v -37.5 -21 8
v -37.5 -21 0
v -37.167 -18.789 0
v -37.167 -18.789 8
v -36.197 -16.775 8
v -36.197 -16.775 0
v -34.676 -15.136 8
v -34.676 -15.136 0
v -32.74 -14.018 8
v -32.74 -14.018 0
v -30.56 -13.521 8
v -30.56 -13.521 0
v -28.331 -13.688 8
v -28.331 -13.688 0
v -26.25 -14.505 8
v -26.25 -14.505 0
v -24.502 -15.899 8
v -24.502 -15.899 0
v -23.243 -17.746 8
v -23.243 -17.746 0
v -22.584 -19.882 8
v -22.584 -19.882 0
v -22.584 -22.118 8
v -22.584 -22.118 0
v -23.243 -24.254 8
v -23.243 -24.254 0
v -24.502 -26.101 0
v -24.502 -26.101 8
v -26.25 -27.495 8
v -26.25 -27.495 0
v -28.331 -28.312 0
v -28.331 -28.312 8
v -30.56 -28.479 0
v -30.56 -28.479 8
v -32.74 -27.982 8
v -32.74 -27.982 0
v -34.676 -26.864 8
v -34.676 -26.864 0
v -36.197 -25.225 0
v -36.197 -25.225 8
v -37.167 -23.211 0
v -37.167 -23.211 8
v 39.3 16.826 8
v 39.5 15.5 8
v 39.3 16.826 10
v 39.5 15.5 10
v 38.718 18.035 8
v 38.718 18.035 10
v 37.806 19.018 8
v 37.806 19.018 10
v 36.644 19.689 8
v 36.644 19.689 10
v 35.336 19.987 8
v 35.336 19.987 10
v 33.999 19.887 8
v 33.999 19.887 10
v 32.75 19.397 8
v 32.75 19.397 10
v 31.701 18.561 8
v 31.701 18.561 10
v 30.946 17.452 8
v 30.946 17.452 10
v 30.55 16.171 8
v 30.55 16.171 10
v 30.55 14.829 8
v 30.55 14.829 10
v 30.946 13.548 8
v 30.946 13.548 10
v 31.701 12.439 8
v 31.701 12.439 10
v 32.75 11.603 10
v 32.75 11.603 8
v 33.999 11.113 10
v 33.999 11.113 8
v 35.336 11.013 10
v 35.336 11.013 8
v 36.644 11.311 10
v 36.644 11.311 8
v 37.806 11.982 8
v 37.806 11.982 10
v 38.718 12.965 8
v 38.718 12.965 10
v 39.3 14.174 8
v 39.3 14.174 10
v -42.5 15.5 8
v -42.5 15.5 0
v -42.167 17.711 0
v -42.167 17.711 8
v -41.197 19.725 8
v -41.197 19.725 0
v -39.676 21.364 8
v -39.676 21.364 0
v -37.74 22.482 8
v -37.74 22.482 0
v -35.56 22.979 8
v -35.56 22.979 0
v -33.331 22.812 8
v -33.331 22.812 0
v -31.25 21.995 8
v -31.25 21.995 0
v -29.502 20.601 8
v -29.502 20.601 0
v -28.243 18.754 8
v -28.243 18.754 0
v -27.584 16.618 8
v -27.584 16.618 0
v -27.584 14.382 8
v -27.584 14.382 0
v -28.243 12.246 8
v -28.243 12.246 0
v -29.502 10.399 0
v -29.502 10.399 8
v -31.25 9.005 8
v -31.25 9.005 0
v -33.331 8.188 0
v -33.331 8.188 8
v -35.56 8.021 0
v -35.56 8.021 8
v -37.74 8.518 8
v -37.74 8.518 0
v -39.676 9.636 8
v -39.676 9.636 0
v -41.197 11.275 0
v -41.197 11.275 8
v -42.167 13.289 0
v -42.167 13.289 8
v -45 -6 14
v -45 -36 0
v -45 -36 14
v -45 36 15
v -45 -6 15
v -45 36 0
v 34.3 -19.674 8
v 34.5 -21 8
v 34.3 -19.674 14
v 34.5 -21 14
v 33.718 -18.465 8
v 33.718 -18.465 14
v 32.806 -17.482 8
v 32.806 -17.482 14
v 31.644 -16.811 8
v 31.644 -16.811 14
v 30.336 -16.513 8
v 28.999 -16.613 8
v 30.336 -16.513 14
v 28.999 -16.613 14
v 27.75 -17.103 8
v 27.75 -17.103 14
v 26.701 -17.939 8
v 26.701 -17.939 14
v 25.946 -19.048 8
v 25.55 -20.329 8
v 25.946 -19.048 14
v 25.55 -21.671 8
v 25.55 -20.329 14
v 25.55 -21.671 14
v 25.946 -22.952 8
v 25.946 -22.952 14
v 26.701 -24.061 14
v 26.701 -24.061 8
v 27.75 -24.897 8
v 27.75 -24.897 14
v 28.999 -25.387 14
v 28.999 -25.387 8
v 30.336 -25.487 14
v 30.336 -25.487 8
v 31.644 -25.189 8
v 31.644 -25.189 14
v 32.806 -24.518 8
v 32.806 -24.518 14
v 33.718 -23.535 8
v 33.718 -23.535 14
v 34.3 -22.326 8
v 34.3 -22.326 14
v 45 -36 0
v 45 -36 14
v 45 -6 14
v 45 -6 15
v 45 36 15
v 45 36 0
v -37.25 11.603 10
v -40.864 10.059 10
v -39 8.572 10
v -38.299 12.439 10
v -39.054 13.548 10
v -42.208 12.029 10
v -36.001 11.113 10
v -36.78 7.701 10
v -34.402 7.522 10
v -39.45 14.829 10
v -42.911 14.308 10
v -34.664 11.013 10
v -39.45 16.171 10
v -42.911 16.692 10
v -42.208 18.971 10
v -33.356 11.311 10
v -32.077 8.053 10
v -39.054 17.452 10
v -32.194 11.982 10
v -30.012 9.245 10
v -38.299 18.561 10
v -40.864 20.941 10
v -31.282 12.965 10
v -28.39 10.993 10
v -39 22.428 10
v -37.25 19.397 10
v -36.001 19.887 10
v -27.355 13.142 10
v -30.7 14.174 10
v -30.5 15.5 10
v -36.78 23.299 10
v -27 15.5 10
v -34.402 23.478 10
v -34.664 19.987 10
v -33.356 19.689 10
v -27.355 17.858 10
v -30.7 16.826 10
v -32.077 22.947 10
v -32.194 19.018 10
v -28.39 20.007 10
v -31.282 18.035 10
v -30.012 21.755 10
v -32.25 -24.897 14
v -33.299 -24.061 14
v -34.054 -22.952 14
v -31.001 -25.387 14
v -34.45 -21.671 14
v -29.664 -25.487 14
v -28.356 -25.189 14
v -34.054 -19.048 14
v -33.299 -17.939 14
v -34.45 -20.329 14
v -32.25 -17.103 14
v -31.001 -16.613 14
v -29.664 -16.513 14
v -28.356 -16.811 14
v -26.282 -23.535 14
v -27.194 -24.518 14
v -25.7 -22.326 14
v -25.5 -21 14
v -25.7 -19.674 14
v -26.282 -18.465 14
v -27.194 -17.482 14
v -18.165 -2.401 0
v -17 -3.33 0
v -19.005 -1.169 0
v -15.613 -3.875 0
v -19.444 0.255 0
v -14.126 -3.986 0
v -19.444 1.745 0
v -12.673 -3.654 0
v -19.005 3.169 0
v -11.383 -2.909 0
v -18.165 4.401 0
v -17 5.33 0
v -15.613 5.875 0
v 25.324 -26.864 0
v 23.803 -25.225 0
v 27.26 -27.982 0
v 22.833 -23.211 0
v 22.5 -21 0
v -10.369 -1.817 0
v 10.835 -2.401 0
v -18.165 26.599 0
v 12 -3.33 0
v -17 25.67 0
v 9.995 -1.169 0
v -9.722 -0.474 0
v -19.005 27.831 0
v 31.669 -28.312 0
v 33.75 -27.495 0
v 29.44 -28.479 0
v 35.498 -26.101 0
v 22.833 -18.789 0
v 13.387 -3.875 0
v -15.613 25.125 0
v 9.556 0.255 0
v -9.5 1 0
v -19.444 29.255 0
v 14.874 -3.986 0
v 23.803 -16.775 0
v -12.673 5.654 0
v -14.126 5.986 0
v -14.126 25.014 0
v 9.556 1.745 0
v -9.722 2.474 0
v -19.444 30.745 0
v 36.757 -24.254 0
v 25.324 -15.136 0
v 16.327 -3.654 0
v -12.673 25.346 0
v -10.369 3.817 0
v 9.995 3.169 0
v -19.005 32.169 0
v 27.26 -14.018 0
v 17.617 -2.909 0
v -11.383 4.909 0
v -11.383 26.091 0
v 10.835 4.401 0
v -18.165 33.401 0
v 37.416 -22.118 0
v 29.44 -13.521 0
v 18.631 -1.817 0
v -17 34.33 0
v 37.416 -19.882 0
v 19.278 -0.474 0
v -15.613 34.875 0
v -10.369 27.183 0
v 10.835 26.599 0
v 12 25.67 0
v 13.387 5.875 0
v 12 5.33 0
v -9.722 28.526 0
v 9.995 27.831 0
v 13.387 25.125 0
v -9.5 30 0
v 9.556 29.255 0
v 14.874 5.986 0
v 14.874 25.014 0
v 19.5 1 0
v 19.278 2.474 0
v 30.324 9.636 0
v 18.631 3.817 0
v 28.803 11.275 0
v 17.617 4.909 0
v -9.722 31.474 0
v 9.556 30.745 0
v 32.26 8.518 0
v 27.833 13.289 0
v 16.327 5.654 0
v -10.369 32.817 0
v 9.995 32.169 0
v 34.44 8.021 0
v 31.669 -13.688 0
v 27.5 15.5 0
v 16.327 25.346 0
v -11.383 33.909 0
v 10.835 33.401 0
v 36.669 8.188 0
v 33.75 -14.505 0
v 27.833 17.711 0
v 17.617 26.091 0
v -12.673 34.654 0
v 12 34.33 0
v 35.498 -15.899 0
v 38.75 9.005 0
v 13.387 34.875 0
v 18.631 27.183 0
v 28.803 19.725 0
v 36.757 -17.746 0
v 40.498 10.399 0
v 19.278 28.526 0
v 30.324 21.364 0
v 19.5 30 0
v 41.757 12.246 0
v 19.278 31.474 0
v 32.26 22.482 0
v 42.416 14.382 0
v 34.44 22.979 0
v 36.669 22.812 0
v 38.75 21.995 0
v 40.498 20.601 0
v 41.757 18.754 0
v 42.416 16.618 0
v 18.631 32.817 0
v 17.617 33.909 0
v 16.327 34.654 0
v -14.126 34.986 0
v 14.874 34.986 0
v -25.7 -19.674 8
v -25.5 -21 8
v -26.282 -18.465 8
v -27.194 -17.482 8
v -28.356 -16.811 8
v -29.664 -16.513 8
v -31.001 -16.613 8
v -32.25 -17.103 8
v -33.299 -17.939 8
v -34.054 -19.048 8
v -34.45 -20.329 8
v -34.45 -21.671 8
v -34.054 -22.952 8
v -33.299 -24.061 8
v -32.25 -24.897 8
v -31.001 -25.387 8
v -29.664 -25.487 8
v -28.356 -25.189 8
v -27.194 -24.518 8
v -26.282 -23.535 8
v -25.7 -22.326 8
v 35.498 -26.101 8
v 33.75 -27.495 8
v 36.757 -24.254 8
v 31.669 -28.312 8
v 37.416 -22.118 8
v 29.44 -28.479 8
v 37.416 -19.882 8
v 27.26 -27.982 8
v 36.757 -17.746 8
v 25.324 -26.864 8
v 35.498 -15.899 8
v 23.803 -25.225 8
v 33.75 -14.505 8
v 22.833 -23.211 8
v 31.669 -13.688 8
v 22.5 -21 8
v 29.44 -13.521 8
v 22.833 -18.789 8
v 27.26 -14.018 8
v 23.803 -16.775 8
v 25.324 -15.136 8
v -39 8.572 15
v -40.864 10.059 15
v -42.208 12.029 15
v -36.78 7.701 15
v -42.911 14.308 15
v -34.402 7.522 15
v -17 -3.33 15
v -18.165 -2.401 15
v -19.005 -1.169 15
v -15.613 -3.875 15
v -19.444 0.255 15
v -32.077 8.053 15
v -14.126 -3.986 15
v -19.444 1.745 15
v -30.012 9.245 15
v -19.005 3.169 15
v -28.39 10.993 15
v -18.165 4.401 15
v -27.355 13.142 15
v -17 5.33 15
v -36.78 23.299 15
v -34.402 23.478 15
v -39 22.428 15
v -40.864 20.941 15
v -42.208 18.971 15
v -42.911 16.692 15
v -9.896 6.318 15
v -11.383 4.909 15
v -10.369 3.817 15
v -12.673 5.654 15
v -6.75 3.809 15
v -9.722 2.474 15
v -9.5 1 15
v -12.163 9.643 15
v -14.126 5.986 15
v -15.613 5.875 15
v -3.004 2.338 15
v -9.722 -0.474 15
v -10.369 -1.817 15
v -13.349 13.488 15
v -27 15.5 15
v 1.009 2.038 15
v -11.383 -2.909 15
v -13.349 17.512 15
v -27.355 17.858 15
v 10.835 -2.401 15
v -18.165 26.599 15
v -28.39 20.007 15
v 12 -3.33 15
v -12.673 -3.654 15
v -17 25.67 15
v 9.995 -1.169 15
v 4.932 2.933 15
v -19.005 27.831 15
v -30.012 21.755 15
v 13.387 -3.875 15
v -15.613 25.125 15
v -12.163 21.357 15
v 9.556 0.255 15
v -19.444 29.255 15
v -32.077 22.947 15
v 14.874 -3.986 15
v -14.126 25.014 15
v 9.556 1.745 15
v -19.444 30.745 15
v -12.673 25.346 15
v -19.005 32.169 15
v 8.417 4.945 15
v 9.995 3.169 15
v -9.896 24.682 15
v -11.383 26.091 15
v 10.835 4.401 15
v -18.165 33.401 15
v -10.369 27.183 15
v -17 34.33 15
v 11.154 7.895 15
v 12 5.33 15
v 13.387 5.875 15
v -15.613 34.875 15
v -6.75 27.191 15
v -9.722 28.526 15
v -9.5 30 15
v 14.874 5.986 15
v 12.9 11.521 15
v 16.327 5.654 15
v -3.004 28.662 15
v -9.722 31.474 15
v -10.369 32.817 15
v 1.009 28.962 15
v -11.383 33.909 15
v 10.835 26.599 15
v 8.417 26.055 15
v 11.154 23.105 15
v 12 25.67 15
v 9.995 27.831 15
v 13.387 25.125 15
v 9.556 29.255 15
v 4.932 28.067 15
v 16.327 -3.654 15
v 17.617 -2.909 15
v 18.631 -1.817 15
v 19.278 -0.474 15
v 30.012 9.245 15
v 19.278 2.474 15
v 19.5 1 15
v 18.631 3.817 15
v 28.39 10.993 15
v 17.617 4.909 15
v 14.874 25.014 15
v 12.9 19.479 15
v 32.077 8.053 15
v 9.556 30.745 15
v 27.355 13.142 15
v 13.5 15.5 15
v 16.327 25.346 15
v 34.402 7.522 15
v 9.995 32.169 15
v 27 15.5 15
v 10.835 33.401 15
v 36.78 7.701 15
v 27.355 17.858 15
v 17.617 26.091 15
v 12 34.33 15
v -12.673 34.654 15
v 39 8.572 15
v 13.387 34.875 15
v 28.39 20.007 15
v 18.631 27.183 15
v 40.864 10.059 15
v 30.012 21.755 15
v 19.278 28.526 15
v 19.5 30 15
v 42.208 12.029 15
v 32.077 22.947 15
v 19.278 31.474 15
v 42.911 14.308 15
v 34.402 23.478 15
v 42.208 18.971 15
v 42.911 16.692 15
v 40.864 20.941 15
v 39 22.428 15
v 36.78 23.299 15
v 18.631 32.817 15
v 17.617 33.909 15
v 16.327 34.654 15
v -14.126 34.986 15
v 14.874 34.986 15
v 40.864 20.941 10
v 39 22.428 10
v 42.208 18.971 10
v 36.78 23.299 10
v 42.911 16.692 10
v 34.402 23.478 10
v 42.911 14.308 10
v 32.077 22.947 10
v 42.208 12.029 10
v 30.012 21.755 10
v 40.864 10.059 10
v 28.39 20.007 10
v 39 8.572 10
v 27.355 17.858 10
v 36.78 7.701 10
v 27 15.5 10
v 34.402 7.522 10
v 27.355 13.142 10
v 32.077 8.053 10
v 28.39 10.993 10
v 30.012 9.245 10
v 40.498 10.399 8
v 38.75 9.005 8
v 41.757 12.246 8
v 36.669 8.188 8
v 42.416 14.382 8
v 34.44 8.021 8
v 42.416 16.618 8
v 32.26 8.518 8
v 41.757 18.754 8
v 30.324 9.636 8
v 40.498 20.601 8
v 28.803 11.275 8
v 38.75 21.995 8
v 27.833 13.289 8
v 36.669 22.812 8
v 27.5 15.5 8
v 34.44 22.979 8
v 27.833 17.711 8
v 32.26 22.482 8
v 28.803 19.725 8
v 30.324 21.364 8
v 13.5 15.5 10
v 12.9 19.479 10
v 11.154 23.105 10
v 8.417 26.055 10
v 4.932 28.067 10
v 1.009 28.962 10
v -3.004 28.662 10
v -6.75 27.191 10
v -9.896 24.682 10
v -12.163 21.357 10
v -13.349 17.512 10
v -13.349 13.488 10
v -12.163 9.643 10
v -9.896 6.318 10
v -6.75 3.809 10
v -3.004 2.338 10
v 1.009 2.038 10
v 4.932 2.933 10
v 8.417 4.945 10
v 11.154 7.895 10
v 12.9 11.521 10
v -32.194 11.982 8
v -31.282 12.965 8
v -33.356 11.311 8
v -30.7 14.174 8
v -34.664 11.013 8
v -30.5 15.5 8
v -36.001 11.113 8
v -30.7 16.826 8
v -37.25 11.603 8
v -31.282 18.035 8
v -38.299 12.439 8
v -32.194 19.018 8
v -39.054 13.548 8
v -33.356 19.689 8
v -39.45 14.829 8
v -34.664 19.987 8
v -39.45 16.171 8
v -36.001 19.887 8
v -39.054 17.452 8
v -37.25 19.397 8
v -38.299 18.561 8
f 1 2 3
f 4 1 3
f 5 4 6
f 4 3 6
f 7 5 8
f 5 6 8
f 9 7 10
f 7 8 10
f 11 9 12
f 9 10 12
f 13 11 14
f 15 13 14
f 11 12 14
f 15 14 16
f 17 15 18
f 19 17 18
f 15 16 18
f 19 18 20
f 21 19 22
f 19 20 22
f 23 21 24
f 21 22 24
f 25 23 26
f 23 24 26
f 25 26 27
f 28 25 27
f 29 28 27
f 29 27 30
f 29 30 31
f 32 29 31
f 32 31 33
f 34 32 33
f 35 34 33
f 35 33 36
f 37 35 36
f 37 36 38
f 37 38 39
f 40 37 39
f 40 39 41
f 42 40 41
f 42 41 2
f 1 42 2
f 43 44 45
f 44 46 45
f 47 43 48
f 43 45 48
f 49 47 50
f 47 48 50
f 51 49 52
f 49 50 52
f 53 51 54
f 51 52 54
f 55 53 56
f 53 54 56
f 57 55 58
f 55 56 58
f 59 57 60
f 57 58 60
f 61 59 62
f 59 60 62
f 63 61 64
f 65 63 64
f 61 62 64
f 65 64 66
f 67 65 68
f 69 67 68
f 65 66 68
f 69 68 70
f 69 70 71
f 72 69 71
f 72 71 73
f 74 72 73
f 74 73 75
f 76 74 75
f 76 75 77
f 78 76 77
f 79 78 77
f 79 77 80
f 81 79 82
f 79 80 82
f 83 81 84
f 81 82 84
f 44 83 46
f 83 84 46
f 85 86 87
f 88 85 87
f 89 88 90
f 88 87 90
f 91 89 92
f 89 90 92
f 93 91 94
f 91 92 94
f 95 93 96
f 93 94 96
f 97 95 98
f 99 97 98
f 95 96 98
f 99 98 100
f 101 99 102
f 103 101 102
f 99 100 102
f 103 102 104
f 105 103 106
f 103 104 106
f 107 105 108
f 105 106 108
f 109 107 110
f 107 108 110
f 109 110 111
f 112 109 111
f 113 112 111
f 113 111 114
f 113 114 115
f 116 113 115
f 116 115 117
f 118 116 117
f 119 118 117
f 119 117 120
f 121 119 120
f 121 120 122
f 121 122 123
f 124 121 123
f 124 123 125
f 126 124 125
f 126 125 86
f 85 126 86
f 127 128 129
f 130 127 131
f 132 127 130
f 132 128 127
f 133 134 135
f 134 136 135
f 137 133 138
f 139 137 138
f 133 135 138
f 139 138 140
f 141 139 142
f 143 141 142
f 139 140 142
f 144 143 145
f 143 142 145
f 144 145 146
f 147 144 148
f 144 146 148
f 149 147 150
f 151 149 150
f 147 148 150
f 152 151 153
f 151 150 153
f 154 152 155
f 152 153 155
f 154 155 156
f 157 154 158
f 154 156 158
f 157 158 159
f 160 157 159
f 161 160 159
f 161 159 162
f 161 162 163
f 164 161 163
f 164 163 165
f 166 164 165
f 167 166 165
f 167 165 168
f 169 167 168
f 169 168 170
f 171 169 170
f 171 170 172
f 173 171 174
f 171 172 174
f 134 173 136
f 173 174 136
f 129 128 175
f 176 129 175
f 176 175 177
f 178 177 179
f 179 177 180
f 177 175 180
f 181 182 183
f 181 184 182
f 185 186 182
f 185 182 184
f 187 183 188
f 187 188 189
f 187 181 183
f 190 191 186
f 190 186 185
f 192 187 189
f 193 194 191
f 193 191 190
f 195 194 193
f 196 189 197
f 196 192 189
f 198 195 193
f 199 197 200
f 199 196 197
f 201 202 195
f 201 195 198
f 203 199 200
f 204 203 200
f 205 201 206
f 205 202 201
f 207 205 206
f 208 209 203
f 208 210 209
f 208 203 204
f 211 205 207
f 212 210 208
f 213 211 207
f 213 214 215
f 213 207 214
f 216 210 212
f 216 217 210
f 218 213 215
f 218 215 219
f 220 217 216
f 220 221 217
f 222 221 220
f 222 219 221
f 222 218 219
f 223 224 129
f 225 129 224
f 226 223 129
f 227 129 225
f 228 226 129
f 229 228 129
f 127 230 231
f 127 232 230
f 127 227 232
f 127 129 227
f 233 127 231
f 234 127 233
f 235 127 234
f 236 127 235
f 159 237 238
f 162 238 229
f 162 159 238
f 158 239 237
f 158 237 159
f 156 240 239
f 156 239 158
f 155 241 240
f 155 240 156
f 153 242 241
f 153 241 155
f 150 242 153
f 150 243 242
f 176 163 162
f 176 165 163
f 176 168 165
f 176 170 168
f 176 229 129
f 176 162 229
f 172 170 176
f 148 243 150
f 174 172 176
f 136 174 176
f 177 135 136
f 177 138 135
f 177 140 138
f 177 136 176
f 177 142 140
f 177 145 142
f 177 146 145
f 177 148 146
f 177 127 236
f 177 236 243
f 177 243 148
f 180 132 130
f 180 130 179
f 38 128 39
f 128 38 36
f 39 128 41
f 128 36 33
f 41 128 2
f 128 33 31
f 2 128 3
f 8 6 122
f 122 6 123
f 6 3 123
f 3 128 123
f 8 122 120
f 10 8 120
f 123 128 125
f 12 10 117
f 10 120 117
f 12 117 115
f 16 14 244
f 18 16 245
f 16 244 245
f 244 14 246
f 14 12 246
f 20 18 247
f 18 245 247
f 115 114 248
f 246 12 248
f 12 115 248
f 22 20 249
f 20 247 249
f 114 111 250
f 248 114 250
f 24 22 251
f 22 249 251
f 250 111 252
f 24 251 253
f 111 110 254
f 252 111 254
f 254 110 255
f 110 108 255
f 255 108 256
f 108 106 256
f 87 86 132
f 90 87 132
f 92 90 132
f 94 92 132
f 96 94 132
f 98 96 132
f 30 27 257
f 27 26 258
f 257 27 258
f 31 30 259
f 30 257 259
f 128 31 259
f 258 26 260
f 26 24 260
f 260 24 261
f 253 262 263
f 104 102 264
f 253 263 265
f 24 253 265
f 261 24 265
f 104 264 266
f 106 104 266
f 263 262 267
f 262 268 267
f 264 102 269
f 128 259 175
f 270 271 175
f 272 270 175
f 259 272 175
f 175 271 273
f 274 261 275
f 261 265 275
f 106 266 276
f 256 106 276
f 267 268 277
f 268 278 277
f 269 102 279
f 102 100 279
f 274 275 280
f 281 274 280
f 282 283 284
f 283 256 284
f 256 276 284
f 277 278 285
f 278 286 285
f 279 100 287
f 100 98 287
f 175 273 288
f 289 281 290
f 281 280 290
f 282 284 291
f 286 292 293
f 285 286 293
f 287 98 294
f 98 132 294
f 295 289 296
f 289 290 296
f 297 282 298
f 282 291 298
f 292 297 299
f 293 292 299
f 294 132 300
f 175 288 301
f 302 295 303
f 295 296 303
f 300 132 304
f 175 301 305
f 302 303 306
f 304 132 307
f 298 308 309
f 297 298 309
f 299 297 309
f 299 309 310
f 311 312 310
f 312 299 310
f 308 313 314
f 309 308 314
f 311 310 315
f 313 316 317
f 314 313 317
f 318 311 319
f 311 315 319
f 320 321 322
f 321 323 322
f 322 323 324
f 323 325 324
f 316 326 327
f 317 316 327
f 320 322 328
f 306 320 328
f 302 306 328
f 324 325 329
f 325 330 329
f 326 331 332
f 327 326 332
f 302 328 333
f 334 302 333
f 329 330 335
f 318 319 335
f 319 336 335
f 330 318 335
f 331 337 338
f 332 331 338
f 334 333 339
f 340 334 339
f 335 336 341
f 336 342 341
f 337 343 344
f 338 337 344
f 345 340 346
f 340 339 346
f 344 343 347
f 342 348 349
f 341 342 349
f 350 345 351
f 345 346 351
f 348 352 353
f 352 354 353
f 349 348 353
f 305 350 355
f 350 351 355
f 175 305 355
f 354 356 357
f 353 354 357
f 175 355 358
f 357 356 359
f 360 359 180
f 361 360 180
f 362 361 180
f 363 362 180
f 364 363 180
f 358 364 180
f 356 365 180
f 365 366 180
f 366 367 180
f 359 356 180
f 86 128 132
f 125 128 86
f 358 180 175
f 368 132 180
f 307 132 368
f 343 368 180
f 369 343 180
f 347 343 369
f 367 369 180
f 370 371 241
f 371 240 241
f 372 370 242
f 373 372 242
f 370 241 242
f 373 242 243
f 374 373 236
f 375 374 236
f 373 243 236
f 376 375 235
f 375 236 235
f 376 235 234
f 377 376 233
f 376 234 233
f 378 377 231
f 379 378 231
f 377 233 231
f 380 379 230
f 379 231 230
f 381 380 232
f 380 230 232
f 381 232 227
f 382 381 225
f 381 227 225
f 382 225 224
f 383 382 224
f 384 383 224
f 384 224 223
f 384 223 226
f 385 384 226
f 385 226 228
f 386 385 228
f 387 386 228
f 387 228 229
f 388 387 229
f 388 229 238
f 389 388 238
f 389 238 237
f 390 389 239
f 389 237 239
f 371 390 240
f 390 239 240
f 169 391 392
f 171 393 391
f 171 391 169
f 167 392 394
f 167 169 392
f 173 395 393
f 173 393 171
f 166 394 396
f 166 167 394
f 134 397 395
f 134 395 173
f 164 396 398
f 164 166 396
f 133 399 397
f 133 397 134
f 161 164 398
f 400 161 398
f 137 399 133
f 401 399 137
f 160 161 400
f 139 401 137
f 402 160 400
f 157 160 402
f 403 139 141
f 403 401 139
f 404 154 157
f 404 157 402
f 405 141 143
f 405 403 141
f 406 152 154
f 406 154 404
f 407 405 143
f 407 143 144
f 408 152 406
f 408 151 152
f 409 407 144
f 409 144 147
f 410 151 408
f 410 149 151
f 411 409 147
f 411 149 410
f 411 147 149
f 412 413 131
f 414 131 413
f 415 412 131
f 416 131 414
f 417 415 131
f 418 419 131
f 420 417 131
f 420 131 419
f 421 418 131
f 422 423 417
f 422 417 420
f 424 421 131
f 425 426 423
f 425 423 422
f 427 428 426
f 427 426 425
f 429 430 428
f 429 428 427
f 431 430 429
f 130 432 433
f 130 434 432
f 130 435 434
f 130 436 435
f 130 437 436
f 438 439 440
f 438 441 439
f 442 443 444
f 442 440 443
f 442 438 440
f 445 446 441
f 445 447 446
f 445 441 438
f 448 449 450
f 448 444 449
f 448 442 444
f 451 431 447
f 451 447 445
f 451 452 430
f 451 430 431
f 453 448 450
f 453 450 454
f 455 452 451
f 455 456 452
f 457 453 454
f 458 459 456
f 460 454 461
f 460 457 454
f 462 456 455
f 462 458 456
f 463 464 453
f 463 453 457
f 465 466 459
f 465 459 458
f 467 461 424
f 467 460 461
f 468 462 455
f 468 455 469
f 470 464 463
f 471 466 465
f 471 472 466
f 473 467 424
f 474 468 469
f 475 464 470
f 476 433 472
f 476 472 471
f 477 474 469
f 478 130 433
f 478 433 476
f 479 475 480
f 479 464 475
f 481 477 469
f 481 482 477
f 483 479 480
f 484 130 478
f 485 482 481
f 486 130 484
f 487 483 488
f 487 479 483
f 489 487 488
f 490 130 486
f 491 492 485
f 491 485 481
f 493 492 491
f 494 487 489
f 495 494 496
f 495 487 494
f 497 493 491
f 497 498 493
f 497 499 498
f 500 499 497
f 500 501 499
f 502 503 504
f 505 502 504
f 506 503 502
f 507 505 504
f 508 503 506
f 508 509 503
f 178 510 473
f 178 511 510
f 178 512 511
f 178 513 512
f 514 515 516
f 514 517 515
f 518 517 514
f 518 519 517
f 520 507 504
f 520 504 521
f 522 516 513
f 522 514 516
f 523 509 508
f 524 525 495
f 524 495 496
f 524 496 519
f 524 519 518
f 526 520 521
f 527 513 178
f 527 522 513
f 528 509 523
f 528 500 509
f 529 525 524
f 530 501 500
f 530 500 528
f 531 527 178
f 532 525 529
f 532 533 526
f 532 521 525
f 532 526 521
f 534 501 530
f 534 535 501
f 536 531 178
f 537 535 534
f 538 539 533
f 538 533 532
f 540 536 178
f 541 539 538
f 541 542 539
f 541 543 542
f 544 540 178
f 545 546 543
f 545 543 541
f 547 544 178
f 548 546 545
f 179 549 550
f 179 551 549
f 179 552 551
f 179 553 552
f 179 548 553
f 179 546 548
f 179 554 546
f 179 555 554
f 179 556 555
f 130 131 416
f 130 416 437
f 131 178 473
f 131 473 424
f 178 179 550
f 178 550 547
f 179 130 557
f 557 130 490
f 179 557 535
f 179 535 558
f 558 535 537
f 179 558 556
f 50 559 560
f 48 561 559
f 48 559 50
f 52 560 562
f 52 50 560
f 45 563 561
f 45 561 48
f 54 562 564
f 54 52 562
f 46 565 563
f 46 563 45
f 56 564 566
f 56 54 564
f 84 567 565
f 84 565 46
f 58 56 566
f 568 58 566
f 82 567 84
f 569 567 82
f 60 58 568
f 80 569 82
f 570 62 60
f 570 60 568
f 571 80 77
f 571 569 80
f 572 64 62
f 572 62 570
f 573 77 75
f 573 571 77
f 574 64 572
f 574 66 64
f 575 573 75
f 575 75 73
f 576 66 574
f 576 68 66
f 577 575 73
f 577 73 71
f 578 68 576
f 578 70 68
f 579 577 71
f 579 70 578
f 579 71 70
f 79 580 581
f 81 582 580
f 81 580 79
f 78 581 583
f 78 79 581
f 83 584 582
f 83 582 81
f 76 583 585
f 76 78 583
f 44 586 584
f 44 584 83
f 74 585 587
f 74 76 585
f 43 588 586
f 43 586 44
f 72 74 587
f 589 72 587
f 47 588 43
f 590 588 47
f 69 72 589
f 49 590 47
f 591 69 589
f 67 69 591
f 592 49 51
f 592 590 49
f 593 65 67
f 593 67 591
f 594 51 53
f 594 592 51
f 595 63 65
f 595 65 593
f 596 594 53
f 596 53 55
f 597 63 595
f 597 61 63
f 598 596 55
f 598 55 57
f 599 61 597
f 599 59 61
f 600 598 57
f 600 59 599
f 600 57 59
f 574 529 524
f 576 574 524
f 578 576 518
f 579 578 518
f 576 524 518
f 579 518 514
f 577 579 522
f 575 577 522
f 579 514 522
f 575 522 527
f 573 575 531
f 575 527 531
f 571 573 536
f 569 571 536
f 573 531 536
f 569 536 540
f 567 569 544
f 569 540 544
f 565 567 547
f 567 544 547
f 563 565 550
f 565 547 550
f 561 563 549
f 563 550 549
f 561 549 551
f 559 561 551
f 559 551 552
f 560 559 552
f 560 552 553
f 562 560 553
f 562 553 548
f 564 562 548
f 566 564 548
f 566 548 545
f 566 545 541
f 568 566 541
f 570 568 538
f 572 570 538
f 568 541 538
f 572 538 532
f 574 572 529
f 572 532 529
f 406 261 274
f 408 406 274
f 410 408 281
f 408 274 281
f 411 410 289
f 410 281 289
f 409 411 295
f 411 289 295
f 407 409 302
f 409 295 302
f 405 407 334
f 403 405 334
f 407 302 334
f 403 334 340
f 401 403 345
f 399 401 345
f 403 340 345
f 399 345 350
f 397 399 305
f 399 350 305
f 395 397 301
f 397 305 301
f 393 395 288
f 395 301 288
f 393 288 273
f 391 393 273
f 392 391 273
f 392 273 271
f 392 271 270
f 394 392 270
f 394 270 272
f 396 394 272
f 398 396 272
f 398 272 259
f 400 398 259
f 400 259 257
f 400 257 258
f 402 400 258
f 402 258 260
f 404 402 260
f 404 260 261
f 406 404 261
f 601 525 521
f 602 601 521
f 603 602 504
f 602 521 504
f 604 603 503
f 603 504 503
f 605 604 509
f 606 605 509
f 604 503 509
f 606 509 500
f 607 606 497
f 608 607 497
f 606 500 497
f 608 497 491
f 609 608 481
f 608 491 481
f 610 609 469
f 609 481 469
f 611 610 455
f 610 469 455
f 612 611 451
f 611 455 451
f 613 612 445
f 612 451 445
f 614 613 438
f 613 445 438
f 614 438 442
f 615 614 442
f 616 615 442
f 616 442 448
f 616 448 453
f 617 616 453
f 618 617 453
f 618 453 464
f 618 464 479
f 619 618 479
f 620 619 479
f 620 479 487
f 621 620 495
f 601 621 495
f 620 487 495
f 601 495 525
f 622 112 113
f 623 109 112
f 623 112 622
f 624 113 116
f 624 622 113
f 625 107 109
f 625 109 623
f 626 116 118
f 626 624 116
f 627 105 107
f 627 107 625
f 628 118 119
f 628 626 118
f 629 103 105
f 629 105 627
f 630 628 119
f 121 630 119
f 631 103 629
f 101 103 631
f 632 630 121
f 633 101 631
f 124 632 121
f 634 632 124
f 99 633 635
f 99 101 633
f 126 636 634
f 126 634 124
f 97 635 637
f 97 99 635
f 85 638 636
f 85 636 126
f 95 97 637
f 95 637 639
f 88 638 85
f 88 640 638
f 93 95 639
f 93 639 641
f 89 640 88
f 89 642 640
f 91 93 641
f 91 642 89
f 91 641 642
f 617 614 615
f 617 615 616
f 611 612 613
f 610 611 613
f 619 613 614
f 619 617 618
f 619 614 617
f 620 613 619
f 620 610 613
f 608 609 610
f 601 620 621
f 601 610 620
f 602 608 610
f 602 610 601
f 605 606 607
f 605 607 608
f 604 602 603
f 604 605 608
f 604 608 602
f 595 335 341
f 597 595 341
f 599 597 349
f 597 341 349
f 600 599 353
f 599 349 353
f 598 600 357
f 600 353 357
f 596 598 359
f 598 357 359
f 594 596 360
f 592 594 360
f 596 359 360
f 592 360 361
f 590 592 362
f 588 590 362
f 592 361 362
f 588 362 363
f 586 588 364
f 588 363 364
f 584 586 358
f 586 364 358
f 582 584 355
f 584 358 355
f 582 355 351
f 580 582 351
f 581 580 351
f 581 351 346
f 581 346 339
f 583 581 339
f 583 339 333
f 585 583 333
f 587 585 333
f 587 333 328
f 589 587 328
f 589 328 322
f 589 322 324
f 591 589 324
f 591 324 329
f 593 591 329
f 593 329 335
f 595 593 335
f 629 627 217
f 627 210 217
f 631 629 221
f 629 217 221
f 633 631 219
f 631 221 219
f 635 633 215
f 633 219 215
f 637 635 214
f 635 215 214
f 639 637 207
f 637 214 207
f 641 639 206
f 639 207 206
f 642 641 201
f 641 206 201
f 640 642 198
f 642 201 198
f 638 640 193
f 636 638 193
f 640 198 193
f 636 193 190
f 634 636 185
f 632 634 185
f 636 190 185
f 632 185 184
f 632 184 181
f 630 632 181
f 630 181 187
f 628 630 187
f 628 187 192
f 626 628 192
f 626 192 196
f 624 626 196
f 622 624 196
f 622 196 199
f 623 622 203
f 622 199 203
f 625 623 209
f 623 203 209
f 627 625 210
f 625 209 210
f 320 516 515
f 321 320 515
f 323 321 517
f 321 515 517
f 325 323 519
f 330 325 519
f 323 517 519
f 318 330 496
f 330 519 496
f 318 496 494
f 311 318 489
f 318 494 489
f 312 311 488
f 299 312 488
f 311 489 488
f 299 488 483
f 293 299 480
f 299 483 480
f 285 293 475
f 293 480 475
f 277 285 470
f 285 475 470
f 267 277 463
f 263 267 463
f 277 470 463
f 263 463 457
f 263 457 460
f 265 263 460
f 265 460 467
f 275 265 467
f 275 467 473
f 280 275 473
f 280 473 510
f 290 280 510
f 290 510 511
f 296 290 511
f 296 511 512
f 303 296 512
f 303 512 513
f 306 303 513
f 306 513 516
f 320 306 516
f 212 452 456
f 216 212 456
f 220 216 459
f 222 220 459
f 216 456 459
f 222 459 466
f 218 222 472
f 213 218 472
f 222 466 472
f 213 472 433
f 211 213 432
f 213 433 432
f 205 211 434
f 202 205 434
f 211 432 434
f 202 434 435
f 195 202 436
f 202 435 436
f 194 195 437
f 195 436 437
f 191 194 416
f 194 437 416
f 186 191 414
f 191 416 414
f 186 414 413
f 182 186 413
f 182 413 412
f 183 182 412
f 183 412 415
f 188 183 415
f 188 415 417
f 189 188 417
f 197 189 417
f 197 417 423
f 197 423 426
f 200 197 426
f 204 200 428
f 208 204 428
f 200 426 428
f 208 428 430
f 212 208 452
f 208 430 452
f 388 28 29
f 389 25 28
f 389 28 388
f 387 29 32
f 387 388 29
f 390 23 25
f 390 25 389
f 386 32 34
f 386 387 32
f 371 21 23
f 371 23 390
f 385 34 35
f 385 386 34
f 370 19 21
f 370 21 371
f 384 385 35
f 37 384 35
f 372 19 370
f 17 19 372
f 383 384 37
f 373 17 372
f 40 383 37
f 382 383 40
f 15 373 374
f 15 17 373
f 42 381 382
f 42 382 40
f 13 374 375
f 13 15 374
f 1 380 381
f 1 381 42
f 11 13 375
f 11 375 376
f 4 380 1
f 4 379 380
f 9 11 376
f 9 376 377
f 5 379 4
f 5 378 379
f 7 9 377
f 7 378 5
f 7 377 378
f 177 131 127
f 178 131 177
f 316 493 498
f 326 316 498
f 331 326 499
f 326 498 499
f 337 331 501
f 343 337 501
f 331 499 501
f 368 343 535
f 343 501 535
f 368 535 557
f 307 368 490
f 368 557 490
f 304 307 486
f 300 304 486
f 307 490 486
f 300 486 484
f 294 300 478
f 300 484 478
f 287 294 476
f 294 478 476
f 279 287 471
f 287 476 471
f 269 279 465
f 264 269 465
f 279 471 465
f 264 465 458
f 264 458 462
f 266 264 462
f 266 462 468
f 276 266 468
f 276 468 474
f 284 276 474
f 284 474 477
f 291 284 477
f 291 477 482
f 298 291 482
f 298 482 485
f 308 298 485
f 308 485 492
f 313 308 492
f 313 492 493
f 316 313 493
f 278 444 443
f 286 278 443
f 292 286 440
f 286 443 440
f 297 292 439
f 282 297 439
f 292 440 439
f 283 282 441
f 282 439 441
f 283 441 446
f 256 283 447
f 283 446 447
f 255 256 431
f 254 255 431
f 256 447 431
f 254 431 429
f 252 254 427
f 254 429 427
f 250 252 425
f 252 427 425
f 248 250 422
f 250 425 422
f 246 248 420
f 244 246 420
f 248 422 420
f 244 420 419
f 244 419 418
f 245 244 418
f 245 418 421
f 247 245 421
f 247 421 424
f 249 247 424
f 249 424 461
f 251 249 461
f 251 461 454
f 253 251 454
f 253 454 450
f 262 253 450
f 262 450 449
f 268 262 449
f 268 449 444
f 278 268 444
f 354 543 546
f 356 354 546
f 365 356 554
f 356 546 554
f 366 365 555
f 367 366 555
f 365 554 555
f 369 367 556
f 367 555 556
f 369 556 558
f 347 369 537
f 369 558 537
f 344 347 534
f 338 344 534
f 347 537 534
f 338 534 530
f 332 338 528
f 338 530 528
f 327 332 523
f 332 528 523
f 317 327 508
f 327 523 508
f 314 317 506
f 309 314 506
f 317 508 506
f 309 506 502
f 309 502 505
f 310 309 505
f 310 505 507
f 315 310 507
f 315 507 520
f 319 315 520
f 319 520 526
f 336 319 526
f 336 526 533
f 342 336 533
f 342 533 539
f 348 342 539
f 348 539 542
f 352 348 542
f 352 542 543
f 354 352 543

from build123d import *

# Parameters (mm, degrees)
SKETCH1_W                      = 90
SKETCH1_H                      = 72
BOSS_EXTRUDE1_DEPTH            = 15
SKETCH2_W                      = 90
SKETCH2_H                      = 30
CUT_EXTRUDE1_DEPTH             = 1
SKETCH3_R                      = 5
CUT_EXTRUDE2_DEPTH             = 60.548299724
SKETCH4_R                      = 13.5
SKETCH4_R_2                    = 8
CUT_EXTRUDE3_DEPTH             = 5
CBORE_FOR_M8_SHCS1_D           = 9
CBORE_FOR_M8_SHCS1_DEPTH       = 15
CBORE_FOR_M8_SHCS1_CBORE_D     = 15
CBORE_FOR_M8_SHCS1_CBORE_DEPTH = 8
CBORE_FOR_M8_SHCS1_TIP         = 2.703872786


with BuildPart() as part:
    # Sketch1 → Boss-Extrude1 (new body)
    with BuildSketch(Plane.XY):
        Rectangle(SKETCH1_W, SKETCH1_H)
    extrude(amount=BOSS_EXTRUDE1_DEPTH)

    # Sketch2 → Cut-Extrude1 (cut)
    with BuildSketch(Plane.XY.offset(15)):
        with Locations((0, -21)):
            Rectangle(SKETCH2_W, SKETCH2_H)
    extrude(amount=-CUT_EXTRUDE1_DEPTH, mode=Mode.SUBTRACT)

    # Sketch3 → Cut-Extrude2 (cut, through all)
    with BuildSketch(Plane.XY.offset(15)):
        with Locations((-14.5, 30)):
            Circle(SKETCH3_R)
        with Locations((14.5, 30)):
            Circle(SKETCH3_R)
        with Locations((14.5, 1)):
            Circle(SKETCH3_R)
        with Locations((-14.5, 1)):
            Circle(SKETCH3_R)
    extrude(amount=-CUT_EXTRUDE2_DEPTH, mode=Mode.SUBTRACT)

    # Sketch4 → Cut-Extrude3 (cut)
    with BuildSketch(Plane.XY.offset(15)):
        with Locations((0, 15.5)):
            Circle(SKETCH4_R)
        with Locations((-35, 15.5)):
            Circle(SKETCH4_R_2)
        with Locations(Location((35, 15.5, 0), (0, 0, 180))):
            Circle(SKETCH4_R_2)
    extrude(amount=-CUT_EXTRUDE3_DEPTH, mode=Mode.SUBTRACT)

    # CBORE for M8 SHCS1
    with Locations(Plane(origin=(0, 0, 0), x_dir=(-1, 0, 0), z_dir=(0, 0, -1))):
        with Locations((30, -21), (-30, -21), (-35, 15.5), (35, 15.5)):
            CounterBoreHole(CBORE_FOR_M8_SHCS1_D / 2, CBORE_FOR_M8_SHCS1_CBORE_D / 2, CBORE_FOR_M8_SHCS1_CBORE_DEPTH, depth=CBORE_FOR_M8_SHCS1_DEPTH)
            with Locations((0, 0, -(CBORE_FOR_M8_SHCS1_DEPTH + CBORE_FOR_M8_SHCS1_TIP / 2))):  # 118° drill point
                Cone(0, CBORE_FOR_M8_SHCS1_D / 2, CBORE_FOR_M8_SHCS1_TIP, mode=Mode.SUBTRACT)


solid = part.part
